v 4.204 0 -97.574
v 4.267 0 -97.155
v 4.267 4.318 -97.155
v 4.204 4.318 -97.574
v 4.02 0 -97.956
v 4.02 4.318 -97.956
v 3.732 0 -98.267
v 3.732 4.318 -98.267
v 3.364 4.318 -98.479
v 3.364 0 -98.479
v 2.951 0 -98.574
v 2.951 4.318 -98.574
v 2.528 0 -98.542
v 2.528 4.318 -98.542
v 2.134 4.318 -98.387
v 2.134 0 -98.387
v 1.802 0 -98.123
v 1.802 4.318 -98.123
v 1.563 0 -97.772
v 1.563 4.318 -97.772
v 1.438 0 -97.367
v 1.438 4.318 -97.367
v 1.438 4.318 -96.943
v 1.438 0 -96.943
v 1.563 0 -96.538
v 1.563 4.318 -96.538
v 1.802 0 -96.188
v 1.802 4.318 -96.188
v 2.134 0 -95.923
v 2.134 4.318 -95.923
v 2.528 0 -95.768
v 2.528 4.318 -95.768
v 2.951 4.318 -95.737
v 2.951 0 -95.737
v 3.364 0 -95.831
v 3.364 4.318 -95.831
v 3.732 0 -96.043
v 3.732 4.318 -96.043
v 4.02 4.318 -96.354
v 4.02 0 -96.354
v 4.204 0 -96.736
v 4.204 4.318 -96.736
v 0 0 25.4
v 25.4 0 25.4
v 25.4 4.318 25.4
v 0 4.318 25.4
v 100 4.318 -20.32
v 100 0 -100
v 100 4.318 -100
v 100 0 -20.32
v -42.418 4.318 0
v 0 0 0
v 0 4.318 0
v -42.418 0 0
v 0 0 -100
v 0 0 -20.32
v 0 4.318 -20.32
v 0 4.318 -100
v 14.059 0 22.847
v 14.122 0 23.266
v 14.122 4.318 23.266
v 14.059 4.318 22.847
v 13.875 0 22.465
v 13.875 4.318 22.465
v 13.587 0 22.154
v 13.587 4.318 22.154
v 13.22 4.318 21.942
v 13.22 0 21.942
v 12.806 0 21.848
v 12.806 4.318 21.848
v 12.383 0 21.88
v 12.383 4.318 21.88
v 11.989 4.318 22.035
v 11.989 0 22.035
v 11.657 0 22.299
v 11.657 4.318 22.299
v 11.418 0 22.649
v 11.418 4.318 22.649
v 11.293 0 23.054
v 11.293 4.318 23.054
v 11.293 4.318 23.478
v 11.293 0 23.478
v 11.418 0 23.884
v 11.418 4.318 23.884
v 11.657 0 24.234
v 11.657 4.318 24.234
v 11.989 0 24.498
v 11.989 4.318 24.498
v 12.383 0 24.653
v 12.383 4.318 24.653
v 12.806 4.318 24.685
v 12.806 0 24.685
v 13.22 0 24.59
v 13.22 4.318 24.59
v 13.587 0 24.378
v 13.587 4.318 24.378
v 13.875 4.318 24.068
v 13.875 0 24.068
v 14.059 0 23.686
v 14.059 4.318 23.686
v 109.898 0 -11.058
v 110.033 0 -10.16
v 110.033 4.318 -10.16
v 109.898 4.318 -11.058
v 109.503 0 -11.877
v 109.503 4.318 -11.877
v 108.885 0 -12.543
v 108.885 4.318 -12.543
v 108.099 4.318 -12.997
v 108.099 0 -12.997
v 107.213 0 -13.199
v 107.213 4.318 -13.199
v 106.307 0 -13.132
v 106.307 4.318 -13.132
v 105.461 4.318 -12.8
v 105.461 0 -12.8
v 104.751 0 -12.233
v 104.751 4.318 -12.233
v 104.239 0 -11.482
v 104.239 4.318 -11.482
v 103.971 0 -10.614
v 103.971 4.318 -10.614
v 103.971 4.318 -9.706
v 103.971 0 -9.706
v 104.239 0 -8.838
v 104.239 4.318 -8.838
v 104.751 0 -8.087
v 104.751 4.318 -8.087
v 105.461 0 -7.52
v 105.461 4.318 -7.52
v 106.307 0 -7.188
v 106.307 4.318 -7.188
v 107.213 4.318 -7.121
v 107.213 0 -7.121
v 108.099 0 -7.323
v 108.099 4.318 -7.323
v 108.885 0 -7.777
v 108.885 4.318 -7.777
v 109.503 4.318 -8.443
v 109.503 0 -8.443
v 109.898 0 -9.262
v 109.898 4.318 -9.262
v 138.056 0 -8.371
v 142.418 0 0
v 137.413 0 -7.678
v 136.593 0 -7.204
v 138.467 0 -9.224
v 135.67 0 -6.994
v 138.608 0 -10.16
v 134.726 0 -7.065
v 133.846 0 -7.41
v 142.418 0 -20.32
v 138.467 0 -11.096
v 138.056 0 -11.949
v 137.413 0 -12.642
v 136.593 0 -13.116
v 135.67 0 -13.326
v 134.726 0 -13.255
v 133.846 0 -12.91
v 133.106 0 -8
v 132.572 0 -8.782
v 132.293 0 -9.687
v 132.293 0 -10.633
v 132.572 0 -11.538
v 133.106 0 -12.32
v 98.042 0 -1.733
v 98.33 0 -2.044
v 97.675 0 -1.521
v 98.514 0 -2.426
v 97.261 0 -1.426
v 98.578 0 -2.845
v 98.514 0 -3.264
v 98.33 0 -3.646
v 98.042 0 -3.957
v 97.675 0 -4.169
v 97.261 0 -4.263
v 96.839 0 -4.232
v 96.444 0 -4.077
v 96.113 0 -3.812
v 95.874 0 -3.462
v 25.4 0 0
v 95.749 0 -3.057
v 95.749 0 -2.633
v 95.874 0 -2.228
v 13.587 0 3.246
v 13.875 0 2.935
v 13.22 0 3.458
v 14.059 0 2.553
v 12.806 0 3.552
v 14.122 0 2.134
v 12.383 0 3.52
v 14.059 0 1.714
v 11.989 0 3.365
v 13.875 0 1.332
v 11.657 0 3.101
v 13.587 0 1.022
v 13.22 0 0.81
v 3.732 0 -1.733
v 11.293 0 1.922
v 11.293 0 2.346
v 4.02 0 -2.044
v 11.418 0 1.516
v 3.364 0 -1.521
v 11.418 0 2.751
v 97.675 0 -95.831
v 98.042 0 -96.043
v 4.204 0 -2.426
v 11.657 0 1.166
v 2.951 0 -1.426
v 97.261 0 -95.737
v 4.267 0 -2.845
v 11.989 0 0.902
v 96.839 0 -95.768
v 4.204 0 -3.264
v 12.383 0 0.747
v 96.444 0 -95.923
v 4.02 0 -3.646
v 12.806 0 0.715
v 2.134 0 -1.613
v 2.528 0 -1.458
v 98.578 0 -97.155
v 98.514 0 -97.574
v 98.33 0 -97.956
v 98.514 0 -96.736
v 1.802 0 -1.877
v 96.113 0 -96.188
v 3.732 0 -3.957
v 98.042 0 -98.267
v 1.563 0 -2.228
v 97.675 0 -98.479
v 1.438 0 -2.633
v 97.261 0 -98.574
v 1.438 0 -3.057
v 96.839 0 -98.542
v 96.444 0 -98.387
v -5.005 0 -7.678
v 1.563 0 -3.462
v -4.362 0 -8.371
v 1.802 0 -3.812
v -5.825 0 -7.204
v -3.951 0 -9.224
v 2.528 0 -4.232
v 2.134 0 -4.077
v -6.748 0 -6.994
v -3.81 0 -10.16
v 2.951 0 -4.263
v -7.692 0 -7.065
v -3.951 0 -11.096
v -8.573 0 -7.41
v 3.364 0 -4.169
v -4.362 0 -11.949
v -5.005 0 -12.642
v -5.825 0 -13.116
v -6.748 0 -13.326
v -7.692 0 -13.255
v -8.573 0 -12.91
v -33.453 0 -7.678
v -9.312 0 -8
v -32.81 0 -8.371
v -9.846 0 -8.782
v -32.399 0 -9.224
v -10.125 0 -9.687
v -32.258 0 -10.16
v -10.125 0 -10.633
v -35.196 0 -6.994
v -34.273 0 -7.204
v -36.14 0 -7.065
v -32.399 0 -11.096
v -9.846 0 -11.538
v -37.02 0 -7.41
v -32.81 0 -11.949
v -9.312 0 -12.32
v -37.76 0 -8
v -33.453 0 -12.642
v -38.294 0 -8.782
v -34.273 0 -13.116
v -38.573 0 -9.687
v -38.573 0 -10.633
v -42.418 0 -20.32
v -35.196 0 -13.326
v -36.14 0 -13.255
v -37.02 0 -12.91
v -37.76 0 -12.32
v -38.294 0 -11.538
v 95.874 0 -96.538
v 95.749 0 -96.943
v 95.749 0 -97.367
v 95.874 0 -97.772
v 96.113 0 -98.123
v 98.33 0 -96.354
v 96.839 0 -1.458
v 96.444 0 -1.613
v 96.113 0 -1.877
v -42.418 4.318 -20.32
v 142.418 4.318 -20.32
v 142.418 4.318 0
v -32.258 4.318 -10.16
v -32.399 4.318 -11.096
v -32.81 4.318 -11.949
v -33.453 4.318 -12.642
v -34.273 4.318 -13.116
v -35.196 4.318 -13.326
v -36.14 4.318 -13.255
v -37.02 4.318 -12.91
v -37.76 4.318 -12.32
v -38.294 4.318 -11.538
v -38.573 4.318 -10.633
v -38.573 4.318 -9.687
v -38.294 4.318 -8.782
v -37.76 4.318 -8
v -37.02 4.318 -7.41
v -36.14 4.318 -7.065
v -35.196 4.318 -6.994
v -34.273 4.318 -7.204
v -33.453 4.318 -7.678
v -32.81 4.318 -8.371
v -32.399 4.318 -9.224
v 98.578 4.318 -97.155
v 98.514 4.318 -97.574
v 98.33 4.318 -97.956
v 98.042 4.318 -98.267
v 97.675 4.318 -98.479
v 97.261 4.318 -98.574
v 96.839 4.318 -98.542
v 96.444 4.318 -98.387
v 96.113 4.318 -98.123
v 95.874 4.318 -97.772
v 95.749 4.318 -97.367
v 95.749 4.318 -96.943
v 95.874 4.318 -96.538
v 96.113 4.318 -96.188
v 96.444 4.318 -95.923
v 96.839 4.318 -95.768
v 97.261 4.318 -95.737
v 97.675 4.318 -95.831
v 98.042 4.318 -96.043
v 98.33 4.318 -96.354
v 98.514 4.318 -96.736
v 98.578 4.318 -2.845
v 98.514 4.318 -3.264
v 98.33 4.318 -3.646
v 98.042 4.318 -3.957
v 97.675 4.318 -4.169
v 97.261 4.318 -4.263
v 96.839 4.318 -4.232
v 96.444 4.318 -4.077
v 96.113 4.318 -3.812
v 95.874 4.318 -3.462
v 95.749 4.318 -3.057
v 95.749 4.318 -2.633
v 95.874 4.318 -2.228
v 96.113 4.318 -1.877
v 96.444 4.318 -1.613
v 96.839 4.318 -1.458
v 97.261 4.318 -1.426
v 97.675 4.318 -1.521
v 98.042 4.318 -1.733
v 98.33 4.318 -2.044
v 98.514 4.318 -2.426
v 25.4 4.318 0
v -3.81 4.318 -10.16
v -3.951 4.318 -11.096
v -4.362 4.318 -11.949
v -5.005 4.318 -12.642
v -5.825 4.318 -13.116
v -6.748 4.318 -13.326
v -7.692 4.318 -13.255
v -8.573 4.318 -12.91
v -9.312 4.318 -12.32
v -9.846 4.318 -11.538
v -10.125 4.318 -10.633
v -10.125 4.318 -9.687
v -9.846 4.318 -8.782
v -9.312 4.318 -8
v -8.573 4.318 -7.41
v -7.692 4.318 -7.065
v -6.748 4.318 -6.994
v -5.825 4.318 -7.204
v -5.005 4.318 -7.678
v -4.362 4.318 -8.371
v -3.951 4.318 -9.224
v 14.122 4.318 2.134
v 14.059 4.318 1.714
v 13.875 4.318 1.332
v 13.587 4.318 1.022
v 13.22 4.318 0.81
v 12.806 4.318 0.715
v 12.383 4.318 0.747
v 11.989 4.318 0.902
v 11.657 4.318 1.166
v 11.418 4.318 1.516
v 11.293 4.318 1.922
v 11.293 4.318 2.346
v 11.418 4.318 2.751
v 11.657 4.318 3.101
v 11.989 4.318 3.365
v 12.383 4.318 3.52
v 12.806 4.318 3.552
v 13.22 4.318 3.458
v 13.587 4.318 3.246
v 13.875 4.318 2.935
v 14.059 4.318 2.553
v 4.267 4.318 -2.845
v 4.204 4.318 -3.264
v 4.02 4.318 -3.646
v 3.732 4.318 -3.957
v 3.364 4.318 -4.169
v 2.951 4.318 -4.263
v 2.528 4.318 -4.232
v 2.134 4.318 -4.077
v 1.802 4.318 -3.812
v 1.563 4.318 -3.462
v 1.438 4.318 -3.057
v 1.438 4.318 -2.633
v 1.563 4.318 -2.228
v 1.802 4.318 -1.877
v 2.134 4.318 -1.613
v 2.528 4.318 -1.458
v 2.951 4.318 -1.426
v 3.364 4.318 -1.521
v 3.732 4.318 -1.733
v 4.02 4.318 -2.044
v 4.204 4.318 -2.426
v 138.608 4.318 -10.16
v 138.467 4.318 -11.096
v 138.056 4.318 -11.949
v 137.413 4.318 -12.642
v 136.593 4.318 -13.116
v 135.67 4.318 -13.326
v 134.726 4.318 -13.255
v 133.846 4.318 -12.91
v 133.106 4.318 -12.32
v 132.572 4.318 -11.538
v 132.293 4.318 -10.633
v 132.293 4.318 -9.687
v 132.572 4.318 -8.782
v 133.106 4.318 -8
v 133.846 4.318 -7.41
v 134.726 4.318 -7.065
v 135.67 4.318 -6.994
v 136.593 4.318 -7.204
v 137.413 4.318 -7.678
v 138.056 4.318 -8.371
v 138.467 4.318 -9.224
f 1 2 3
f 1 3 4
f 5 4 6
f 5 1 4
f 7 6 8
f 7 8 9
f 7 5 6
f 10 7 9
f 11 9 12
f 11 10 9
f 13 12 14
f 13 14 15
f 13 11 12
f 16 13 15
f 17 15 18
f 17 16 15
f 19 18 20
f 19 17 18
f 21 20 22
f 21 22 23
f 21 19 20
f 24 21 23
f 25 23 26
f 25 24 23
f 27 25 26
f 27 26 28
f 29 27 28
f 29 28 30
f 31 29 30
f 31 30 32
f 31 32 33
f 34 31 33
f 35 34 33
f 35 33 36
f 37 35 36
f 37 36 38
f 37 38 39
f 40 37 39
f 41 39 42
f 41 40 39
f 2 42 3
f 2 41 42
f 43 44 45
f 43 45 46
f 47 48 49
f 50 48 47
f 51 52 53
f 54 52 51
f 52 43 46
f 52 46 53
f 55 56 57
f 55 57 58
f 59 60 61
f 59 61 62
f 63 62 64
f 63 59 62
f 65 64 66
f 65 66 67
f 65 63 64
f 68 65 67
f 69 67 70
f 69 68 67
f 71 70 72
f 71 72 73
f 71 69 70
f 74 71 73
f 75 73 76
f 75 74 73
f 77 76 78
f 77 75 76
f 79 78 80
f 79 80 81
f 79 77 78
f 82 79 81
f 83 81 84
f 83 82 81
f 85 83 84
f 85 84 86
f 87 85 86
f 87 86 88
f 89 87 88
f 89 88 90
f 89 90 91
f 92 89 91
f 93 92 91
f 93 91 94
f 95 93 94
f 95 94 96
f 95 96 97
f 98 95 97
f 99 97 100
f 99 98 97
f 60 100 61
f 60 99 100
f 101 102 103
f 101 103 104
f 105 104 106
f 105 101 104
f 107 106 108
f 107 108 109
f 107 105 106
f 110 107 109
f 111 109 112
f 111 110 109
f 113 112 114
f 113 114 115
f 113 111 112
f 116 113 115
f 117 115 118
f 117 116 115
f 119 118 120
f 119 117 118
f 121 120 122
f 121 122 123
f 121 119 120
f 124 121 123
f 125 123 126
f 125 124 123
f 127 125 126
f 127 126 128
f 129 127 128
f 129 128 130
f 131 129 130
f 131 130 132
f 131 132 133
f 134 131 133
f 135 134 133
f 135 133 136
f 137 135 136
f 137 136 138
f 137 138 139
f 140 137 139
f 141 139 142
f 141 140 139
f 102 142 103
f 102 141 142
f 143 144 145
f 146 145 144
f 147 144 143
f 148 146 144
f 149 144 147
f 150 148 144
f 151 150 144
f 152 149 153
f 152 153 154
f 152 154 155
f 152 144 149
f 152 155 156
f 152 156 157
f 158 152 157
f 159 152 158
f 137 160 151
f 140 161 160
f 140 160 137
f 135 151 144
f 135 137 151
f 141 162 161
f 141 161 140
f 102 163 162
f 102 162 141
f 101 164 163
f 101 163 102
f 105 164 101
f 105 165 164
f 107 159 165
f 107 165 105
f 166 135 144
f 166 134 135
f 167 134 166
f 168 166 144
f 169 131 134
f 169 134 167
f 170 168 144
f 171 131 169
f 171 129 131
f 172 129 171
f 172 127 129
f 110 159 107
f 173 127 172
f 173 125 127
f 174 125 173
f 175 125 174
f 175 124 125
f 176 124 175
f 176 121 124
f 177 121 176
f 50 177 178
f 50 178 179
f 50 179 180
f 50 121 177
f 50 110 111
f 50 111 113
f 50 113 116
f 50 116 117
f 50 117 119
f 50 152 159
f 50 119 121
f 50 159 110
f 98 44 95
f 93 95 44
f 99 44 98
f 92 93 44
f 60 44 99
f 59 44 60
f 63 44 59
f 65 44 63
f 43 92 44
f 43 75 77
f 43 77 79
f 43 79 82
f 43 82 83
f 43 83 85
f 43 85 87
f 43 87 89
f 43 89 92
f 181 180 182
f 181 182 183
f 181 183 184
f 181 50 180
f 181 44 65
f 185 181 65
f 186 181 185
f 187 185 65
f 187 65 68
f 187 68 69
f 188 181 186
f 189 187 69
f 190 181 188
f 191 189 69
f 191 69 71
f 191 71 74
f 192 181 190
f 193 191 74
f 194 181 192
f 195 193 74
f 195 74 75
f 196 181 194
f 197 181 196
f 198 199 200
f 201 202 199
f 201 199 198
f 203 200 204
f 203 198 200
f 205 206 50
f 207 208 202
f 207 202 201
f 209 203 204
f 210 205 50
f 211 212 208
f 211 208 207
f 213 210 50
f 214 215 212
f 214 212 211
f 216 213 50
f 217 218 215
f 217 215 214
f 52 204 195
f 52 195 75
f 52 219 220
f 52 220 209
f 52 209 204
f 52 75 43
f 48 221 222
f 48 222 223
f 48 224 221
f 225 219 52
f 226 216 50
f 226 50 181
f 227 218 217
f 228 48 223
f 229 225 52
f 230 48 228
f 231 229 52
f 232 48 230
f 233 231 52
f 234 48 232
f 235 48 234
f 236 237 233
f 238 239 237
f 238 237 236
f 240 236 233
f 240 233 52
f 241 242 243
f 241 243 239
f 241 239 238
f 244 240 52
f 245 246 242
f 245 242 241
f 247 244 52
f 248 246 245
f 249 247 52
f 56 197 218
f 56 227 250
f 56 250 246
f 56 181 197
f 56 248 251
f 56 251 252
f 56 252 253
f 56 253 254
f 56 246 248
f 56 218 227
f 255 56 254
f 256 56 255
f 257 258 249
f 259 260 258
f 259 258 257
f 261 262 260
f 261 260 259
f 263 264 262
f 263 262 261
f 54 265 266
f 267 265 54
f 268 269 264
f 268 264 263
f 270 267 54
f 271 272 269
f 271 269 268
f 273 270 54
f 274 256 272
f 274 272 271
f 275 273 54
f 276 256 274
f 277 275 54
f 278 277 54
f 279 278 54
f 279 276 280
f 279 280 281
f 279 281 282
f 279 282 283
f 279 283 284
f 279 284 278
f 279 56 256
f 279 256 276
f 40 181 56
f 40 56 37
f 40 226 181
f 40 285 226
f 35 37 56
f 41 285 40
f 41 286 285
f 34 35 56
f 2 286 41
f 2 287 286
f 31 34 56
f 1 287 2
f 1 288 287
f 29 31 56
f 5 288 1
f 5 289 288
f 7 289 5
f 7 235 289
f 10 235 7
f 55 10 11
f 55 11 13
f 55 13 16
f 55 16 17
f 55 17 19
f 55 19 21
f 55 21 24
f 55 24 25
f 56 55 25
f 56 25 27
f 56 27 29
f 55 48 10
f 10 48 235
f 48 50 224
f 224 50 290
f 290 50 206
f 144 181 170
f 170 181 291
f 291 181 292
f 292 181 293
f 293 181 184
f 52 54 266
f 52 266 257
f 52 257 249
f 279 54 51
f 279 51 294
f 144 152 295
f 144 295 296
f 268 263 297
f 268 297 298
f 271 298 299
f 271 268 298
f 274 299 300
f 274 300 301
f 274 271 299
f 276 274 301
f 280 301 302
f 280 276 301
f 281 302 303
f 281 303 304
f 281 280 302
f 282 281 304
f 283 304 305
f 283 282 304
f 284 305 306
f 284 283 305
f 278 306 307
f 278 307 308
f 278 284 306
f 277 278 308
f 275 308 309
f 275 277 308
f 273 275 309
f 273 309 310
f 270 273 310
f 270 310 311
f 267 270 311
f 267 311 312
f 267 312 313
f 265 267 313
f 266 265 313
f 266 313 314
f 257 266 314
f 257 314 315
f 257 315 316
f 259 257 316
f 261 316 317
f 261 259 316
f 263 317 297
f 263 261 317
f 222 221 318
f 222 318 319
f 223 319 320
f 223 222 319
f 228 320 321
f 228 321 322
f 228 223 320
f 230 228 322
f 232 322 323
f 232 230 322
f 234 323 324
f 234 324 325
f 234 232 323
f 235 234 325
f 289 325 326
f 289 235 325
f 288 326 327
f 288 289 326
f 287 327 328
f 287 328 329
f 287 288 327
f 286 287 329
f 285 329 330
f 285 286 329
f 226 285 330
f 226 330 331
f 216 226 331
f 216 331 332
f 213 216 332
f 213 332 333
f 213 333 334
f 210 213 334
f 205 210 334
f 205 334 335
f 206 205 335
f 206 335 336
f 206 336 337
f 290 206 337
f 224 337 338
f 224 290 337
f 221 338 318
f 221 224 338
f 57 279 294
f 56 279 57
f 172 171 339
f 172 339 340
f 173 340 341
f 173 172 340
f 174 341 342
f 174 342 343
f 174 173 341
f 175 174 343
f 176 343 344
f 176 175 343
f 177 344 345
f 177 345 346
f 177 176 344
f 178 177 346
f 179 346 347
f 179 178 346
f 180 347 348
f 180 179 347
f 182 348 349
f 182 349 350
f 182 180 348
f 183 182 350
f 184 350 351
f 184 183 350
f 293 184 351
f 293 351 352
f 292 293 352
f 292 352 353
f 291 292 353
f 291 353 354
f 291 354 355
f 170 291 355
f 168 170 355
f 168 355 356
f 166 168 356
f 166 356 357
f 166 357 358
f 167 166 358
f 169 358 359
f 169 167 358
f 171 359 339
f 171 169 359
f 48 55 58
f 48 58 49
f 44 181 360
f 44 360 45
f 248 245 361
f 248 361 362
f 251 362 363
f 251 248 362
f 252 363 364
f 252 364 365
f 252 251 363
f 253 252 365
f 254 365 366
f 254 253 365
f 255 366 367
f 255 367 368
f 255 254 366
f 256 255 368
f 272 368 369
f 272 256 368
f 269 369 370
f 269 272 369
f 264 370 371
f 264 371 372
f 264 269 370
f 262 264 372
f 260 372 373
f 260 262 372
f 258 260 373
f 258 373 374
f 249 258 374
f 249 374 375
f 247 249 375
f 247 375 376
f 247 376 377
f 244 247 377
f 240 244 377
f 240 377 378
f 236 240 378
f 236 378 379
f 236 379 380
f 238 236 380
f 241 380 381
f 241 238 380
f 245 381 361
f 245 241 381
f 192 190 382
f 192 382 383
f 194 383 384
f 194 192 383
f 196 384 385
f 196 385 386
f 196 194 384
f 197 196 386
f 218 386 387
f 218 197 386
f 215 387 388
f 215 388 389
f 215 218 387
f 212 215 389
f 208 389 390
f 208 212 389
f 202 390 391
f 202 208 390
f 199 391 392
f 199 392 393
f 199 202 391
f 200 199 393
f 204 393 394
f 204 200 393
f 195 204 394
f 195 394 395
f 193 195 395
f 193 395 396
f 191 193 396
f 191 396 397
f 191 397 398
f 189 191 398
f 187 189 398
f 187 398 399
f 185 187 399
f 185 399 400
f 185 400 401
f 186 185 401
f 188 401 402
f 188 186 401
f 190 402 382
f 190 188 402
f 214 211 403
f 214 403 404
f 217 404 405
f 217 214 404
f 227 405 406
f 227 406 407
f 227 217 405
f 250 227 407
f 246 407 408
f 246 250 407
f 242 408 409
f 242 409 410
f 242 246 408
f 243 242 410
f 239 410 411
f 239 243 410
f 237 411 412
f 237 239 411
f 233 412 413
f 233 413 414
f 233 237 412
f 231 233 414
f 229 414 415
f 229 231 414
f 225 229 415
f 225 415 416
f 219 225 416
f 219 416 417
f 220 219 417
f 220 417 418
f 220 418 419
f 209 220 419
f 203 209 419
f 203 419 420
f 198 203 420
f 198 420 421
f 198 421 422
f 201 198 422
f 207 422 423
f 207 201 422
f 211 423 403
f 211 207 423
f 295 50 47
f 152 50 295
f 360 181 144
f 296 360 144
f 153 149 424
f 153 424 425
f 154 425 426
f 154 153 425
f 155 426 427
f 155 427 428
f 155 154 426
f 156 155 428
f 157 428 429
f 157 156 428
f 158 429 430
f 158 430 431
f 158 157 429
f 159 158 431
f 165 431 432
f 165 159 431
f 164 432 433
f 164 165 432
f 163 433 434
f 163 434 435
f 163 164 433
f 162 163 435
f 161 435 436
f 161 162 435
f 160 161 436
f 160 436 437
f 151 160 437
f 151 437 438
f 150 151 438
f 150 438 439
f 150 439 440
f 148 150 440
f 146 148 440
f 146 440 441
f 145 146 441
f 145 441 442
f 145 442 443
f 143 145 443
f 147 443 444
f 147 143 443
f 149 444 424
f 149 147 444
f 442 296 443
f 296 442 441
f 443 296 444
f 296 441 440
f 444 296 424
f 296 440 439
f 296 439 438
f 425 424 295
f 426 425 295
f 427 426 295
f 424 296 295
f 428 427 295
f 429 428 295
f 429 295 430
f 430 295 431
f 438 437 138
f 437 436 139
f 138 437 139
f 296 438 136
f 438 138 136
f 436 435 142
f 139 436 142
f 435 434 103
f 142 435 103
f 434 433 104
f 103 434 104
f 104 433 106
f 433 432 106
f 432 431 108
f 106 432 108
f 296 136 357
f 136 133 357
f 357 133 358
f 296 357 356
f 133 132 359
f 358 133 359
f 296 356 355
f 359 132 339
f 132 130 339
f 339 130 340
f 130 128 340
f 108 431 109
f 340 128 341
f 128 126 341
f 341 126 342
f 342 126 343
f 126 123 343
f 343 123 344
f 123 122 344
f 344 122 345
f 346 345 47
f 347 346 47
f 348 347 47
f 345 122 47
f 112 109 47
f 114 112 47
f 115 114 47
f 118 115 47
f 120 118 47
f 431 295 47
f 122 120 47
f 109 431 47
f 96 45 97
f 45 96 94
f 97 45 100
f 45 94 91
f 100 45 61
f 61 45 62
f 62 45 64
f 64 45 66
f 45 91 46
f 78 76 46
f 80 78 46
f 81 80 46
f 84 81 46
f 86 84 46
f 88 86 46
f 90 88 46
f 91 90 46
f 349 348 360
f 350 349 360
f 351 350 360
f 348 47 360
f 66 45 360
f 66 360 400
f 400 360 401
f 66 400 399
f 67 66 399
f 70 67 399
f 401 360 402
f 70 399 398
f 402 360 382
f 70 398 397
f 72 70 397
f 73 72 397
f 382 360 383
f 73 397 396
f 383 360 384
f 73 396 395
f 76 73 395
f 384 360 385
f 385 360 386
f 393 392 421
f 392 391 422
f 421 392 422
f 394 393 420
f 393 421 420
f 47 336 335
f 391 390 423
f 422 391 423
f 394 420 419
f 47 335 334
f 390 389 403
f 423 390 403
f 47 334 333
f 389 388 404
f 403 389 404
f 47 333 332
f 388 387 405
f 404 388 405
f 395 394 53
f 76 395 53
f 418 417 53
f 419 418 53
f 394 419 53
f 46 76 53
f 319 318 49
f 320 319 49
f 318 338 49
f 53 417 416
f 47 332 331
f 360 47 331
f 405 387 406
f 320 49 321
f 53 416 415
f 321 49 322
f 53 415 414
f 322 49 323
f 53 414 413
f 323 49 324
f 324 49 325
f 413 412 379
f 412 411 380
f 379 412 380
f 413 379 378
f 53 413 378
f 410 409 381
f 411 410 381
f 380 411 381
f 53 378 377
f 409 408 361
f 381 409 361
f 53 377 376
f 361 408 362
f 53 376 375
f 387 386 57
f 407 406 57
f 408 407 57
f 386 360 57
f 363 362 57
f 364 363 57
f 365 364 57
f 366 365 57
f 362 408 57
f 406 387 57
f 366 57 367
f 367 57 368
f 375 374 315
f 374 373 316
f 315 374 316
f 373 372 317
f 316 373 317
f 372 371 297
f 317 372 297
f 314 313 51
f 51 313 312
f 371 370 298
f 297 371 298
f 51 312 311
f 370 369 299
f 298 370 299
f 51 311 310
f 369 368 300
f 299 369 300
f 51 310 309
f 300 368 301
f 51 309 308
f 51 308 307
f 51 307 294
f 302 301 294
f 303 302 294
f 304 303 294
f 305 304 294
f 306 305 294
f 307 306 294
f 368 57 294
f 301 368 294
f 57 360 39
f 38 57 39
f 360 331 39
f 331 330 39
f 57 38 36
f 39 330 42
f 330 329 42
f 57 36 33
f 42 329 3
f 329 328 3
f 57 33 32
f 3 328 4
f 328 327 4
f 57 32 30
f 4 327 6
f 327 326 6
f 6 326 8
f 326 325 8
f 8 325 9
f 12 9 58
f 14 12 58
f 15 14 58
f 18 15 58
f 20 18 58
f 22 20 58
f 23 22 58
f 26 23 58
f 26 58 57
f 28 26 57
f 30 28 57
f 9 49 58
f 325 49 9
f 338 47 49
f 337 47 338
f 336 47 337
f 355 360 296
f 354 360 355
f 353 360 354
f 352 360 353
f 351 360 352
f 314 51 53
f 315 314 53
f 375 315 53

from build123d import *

# Parameters (mm, degrees)
SKETCH1_R           = 1.4224
SKETCH1_R_2         = 3.175
SKETCH1_R_3         = 3.048
BOSS_EXTRUDE2_DEPTH = 4.318


with BuildPart() as part:
    # Sketch1 → Boss-Extrude2 (new body)
    with BuildSketch(Plane(origin=(0, 0, 0), x_dir=(1, 0, 0), z_dir=(0, 1, 0))):
        Polygon((0, 20.32), (0, 100), (100, 100), (100, 20.32), (142.418, 20.32), (142.418, 0), (100, 0), (25.4, 0), (25.4, -25.4), (0, -25.4), (0, 0), (-42.418, 0), (-42.418, 20.32), align=None)
        with Locations((2.8448, 2.8448)):
            Circle(SKETCH1_R, mode=Mode.SUBTRACT)
        with Locations((97.1552, 2.8448)):
            Circle(SKETCH1_R, mode=Mode.SUBTRACT)
        with Locations((2.8448, 97.1552)):
            Circle(SKETCH1_R, mode=Mode.SUBTRACT)
        with Locations((97.1552, 97.1552)):
            Circle(SKETCH1_R, mode=Mode.SUBTRACT)
        with Locations((12.7, -23.2664)):
            Circle(SKETCH1_R, mode=Mode.SUBTRACT)
        with Locations((12.7, -2.1336)):
            Circle(SKETCH1_R, mode=Mode.SUBTRACT)
        with Locations((-6.985, 10.16)):
            Circle(SKETCH1_R_2, mode=Mode.SUBTRACT)
        with Locations((-35.433, 10.16)):
            Circle(SKETCH1_R_2, mode=Mode.SUBTRACT)
        with Locations((106.985, 10.16)):
            Circle(SKETCH1_R_3, mode=Mode.SUBTRACT)
        with Locations((135.433, 10.16)):
            Circle(SKETCH1_R_2, mode=Mode.SUBTRACT)
    extrude(amount=BOSS_EXTRUDE2_DEPTH)


solid = part.part
